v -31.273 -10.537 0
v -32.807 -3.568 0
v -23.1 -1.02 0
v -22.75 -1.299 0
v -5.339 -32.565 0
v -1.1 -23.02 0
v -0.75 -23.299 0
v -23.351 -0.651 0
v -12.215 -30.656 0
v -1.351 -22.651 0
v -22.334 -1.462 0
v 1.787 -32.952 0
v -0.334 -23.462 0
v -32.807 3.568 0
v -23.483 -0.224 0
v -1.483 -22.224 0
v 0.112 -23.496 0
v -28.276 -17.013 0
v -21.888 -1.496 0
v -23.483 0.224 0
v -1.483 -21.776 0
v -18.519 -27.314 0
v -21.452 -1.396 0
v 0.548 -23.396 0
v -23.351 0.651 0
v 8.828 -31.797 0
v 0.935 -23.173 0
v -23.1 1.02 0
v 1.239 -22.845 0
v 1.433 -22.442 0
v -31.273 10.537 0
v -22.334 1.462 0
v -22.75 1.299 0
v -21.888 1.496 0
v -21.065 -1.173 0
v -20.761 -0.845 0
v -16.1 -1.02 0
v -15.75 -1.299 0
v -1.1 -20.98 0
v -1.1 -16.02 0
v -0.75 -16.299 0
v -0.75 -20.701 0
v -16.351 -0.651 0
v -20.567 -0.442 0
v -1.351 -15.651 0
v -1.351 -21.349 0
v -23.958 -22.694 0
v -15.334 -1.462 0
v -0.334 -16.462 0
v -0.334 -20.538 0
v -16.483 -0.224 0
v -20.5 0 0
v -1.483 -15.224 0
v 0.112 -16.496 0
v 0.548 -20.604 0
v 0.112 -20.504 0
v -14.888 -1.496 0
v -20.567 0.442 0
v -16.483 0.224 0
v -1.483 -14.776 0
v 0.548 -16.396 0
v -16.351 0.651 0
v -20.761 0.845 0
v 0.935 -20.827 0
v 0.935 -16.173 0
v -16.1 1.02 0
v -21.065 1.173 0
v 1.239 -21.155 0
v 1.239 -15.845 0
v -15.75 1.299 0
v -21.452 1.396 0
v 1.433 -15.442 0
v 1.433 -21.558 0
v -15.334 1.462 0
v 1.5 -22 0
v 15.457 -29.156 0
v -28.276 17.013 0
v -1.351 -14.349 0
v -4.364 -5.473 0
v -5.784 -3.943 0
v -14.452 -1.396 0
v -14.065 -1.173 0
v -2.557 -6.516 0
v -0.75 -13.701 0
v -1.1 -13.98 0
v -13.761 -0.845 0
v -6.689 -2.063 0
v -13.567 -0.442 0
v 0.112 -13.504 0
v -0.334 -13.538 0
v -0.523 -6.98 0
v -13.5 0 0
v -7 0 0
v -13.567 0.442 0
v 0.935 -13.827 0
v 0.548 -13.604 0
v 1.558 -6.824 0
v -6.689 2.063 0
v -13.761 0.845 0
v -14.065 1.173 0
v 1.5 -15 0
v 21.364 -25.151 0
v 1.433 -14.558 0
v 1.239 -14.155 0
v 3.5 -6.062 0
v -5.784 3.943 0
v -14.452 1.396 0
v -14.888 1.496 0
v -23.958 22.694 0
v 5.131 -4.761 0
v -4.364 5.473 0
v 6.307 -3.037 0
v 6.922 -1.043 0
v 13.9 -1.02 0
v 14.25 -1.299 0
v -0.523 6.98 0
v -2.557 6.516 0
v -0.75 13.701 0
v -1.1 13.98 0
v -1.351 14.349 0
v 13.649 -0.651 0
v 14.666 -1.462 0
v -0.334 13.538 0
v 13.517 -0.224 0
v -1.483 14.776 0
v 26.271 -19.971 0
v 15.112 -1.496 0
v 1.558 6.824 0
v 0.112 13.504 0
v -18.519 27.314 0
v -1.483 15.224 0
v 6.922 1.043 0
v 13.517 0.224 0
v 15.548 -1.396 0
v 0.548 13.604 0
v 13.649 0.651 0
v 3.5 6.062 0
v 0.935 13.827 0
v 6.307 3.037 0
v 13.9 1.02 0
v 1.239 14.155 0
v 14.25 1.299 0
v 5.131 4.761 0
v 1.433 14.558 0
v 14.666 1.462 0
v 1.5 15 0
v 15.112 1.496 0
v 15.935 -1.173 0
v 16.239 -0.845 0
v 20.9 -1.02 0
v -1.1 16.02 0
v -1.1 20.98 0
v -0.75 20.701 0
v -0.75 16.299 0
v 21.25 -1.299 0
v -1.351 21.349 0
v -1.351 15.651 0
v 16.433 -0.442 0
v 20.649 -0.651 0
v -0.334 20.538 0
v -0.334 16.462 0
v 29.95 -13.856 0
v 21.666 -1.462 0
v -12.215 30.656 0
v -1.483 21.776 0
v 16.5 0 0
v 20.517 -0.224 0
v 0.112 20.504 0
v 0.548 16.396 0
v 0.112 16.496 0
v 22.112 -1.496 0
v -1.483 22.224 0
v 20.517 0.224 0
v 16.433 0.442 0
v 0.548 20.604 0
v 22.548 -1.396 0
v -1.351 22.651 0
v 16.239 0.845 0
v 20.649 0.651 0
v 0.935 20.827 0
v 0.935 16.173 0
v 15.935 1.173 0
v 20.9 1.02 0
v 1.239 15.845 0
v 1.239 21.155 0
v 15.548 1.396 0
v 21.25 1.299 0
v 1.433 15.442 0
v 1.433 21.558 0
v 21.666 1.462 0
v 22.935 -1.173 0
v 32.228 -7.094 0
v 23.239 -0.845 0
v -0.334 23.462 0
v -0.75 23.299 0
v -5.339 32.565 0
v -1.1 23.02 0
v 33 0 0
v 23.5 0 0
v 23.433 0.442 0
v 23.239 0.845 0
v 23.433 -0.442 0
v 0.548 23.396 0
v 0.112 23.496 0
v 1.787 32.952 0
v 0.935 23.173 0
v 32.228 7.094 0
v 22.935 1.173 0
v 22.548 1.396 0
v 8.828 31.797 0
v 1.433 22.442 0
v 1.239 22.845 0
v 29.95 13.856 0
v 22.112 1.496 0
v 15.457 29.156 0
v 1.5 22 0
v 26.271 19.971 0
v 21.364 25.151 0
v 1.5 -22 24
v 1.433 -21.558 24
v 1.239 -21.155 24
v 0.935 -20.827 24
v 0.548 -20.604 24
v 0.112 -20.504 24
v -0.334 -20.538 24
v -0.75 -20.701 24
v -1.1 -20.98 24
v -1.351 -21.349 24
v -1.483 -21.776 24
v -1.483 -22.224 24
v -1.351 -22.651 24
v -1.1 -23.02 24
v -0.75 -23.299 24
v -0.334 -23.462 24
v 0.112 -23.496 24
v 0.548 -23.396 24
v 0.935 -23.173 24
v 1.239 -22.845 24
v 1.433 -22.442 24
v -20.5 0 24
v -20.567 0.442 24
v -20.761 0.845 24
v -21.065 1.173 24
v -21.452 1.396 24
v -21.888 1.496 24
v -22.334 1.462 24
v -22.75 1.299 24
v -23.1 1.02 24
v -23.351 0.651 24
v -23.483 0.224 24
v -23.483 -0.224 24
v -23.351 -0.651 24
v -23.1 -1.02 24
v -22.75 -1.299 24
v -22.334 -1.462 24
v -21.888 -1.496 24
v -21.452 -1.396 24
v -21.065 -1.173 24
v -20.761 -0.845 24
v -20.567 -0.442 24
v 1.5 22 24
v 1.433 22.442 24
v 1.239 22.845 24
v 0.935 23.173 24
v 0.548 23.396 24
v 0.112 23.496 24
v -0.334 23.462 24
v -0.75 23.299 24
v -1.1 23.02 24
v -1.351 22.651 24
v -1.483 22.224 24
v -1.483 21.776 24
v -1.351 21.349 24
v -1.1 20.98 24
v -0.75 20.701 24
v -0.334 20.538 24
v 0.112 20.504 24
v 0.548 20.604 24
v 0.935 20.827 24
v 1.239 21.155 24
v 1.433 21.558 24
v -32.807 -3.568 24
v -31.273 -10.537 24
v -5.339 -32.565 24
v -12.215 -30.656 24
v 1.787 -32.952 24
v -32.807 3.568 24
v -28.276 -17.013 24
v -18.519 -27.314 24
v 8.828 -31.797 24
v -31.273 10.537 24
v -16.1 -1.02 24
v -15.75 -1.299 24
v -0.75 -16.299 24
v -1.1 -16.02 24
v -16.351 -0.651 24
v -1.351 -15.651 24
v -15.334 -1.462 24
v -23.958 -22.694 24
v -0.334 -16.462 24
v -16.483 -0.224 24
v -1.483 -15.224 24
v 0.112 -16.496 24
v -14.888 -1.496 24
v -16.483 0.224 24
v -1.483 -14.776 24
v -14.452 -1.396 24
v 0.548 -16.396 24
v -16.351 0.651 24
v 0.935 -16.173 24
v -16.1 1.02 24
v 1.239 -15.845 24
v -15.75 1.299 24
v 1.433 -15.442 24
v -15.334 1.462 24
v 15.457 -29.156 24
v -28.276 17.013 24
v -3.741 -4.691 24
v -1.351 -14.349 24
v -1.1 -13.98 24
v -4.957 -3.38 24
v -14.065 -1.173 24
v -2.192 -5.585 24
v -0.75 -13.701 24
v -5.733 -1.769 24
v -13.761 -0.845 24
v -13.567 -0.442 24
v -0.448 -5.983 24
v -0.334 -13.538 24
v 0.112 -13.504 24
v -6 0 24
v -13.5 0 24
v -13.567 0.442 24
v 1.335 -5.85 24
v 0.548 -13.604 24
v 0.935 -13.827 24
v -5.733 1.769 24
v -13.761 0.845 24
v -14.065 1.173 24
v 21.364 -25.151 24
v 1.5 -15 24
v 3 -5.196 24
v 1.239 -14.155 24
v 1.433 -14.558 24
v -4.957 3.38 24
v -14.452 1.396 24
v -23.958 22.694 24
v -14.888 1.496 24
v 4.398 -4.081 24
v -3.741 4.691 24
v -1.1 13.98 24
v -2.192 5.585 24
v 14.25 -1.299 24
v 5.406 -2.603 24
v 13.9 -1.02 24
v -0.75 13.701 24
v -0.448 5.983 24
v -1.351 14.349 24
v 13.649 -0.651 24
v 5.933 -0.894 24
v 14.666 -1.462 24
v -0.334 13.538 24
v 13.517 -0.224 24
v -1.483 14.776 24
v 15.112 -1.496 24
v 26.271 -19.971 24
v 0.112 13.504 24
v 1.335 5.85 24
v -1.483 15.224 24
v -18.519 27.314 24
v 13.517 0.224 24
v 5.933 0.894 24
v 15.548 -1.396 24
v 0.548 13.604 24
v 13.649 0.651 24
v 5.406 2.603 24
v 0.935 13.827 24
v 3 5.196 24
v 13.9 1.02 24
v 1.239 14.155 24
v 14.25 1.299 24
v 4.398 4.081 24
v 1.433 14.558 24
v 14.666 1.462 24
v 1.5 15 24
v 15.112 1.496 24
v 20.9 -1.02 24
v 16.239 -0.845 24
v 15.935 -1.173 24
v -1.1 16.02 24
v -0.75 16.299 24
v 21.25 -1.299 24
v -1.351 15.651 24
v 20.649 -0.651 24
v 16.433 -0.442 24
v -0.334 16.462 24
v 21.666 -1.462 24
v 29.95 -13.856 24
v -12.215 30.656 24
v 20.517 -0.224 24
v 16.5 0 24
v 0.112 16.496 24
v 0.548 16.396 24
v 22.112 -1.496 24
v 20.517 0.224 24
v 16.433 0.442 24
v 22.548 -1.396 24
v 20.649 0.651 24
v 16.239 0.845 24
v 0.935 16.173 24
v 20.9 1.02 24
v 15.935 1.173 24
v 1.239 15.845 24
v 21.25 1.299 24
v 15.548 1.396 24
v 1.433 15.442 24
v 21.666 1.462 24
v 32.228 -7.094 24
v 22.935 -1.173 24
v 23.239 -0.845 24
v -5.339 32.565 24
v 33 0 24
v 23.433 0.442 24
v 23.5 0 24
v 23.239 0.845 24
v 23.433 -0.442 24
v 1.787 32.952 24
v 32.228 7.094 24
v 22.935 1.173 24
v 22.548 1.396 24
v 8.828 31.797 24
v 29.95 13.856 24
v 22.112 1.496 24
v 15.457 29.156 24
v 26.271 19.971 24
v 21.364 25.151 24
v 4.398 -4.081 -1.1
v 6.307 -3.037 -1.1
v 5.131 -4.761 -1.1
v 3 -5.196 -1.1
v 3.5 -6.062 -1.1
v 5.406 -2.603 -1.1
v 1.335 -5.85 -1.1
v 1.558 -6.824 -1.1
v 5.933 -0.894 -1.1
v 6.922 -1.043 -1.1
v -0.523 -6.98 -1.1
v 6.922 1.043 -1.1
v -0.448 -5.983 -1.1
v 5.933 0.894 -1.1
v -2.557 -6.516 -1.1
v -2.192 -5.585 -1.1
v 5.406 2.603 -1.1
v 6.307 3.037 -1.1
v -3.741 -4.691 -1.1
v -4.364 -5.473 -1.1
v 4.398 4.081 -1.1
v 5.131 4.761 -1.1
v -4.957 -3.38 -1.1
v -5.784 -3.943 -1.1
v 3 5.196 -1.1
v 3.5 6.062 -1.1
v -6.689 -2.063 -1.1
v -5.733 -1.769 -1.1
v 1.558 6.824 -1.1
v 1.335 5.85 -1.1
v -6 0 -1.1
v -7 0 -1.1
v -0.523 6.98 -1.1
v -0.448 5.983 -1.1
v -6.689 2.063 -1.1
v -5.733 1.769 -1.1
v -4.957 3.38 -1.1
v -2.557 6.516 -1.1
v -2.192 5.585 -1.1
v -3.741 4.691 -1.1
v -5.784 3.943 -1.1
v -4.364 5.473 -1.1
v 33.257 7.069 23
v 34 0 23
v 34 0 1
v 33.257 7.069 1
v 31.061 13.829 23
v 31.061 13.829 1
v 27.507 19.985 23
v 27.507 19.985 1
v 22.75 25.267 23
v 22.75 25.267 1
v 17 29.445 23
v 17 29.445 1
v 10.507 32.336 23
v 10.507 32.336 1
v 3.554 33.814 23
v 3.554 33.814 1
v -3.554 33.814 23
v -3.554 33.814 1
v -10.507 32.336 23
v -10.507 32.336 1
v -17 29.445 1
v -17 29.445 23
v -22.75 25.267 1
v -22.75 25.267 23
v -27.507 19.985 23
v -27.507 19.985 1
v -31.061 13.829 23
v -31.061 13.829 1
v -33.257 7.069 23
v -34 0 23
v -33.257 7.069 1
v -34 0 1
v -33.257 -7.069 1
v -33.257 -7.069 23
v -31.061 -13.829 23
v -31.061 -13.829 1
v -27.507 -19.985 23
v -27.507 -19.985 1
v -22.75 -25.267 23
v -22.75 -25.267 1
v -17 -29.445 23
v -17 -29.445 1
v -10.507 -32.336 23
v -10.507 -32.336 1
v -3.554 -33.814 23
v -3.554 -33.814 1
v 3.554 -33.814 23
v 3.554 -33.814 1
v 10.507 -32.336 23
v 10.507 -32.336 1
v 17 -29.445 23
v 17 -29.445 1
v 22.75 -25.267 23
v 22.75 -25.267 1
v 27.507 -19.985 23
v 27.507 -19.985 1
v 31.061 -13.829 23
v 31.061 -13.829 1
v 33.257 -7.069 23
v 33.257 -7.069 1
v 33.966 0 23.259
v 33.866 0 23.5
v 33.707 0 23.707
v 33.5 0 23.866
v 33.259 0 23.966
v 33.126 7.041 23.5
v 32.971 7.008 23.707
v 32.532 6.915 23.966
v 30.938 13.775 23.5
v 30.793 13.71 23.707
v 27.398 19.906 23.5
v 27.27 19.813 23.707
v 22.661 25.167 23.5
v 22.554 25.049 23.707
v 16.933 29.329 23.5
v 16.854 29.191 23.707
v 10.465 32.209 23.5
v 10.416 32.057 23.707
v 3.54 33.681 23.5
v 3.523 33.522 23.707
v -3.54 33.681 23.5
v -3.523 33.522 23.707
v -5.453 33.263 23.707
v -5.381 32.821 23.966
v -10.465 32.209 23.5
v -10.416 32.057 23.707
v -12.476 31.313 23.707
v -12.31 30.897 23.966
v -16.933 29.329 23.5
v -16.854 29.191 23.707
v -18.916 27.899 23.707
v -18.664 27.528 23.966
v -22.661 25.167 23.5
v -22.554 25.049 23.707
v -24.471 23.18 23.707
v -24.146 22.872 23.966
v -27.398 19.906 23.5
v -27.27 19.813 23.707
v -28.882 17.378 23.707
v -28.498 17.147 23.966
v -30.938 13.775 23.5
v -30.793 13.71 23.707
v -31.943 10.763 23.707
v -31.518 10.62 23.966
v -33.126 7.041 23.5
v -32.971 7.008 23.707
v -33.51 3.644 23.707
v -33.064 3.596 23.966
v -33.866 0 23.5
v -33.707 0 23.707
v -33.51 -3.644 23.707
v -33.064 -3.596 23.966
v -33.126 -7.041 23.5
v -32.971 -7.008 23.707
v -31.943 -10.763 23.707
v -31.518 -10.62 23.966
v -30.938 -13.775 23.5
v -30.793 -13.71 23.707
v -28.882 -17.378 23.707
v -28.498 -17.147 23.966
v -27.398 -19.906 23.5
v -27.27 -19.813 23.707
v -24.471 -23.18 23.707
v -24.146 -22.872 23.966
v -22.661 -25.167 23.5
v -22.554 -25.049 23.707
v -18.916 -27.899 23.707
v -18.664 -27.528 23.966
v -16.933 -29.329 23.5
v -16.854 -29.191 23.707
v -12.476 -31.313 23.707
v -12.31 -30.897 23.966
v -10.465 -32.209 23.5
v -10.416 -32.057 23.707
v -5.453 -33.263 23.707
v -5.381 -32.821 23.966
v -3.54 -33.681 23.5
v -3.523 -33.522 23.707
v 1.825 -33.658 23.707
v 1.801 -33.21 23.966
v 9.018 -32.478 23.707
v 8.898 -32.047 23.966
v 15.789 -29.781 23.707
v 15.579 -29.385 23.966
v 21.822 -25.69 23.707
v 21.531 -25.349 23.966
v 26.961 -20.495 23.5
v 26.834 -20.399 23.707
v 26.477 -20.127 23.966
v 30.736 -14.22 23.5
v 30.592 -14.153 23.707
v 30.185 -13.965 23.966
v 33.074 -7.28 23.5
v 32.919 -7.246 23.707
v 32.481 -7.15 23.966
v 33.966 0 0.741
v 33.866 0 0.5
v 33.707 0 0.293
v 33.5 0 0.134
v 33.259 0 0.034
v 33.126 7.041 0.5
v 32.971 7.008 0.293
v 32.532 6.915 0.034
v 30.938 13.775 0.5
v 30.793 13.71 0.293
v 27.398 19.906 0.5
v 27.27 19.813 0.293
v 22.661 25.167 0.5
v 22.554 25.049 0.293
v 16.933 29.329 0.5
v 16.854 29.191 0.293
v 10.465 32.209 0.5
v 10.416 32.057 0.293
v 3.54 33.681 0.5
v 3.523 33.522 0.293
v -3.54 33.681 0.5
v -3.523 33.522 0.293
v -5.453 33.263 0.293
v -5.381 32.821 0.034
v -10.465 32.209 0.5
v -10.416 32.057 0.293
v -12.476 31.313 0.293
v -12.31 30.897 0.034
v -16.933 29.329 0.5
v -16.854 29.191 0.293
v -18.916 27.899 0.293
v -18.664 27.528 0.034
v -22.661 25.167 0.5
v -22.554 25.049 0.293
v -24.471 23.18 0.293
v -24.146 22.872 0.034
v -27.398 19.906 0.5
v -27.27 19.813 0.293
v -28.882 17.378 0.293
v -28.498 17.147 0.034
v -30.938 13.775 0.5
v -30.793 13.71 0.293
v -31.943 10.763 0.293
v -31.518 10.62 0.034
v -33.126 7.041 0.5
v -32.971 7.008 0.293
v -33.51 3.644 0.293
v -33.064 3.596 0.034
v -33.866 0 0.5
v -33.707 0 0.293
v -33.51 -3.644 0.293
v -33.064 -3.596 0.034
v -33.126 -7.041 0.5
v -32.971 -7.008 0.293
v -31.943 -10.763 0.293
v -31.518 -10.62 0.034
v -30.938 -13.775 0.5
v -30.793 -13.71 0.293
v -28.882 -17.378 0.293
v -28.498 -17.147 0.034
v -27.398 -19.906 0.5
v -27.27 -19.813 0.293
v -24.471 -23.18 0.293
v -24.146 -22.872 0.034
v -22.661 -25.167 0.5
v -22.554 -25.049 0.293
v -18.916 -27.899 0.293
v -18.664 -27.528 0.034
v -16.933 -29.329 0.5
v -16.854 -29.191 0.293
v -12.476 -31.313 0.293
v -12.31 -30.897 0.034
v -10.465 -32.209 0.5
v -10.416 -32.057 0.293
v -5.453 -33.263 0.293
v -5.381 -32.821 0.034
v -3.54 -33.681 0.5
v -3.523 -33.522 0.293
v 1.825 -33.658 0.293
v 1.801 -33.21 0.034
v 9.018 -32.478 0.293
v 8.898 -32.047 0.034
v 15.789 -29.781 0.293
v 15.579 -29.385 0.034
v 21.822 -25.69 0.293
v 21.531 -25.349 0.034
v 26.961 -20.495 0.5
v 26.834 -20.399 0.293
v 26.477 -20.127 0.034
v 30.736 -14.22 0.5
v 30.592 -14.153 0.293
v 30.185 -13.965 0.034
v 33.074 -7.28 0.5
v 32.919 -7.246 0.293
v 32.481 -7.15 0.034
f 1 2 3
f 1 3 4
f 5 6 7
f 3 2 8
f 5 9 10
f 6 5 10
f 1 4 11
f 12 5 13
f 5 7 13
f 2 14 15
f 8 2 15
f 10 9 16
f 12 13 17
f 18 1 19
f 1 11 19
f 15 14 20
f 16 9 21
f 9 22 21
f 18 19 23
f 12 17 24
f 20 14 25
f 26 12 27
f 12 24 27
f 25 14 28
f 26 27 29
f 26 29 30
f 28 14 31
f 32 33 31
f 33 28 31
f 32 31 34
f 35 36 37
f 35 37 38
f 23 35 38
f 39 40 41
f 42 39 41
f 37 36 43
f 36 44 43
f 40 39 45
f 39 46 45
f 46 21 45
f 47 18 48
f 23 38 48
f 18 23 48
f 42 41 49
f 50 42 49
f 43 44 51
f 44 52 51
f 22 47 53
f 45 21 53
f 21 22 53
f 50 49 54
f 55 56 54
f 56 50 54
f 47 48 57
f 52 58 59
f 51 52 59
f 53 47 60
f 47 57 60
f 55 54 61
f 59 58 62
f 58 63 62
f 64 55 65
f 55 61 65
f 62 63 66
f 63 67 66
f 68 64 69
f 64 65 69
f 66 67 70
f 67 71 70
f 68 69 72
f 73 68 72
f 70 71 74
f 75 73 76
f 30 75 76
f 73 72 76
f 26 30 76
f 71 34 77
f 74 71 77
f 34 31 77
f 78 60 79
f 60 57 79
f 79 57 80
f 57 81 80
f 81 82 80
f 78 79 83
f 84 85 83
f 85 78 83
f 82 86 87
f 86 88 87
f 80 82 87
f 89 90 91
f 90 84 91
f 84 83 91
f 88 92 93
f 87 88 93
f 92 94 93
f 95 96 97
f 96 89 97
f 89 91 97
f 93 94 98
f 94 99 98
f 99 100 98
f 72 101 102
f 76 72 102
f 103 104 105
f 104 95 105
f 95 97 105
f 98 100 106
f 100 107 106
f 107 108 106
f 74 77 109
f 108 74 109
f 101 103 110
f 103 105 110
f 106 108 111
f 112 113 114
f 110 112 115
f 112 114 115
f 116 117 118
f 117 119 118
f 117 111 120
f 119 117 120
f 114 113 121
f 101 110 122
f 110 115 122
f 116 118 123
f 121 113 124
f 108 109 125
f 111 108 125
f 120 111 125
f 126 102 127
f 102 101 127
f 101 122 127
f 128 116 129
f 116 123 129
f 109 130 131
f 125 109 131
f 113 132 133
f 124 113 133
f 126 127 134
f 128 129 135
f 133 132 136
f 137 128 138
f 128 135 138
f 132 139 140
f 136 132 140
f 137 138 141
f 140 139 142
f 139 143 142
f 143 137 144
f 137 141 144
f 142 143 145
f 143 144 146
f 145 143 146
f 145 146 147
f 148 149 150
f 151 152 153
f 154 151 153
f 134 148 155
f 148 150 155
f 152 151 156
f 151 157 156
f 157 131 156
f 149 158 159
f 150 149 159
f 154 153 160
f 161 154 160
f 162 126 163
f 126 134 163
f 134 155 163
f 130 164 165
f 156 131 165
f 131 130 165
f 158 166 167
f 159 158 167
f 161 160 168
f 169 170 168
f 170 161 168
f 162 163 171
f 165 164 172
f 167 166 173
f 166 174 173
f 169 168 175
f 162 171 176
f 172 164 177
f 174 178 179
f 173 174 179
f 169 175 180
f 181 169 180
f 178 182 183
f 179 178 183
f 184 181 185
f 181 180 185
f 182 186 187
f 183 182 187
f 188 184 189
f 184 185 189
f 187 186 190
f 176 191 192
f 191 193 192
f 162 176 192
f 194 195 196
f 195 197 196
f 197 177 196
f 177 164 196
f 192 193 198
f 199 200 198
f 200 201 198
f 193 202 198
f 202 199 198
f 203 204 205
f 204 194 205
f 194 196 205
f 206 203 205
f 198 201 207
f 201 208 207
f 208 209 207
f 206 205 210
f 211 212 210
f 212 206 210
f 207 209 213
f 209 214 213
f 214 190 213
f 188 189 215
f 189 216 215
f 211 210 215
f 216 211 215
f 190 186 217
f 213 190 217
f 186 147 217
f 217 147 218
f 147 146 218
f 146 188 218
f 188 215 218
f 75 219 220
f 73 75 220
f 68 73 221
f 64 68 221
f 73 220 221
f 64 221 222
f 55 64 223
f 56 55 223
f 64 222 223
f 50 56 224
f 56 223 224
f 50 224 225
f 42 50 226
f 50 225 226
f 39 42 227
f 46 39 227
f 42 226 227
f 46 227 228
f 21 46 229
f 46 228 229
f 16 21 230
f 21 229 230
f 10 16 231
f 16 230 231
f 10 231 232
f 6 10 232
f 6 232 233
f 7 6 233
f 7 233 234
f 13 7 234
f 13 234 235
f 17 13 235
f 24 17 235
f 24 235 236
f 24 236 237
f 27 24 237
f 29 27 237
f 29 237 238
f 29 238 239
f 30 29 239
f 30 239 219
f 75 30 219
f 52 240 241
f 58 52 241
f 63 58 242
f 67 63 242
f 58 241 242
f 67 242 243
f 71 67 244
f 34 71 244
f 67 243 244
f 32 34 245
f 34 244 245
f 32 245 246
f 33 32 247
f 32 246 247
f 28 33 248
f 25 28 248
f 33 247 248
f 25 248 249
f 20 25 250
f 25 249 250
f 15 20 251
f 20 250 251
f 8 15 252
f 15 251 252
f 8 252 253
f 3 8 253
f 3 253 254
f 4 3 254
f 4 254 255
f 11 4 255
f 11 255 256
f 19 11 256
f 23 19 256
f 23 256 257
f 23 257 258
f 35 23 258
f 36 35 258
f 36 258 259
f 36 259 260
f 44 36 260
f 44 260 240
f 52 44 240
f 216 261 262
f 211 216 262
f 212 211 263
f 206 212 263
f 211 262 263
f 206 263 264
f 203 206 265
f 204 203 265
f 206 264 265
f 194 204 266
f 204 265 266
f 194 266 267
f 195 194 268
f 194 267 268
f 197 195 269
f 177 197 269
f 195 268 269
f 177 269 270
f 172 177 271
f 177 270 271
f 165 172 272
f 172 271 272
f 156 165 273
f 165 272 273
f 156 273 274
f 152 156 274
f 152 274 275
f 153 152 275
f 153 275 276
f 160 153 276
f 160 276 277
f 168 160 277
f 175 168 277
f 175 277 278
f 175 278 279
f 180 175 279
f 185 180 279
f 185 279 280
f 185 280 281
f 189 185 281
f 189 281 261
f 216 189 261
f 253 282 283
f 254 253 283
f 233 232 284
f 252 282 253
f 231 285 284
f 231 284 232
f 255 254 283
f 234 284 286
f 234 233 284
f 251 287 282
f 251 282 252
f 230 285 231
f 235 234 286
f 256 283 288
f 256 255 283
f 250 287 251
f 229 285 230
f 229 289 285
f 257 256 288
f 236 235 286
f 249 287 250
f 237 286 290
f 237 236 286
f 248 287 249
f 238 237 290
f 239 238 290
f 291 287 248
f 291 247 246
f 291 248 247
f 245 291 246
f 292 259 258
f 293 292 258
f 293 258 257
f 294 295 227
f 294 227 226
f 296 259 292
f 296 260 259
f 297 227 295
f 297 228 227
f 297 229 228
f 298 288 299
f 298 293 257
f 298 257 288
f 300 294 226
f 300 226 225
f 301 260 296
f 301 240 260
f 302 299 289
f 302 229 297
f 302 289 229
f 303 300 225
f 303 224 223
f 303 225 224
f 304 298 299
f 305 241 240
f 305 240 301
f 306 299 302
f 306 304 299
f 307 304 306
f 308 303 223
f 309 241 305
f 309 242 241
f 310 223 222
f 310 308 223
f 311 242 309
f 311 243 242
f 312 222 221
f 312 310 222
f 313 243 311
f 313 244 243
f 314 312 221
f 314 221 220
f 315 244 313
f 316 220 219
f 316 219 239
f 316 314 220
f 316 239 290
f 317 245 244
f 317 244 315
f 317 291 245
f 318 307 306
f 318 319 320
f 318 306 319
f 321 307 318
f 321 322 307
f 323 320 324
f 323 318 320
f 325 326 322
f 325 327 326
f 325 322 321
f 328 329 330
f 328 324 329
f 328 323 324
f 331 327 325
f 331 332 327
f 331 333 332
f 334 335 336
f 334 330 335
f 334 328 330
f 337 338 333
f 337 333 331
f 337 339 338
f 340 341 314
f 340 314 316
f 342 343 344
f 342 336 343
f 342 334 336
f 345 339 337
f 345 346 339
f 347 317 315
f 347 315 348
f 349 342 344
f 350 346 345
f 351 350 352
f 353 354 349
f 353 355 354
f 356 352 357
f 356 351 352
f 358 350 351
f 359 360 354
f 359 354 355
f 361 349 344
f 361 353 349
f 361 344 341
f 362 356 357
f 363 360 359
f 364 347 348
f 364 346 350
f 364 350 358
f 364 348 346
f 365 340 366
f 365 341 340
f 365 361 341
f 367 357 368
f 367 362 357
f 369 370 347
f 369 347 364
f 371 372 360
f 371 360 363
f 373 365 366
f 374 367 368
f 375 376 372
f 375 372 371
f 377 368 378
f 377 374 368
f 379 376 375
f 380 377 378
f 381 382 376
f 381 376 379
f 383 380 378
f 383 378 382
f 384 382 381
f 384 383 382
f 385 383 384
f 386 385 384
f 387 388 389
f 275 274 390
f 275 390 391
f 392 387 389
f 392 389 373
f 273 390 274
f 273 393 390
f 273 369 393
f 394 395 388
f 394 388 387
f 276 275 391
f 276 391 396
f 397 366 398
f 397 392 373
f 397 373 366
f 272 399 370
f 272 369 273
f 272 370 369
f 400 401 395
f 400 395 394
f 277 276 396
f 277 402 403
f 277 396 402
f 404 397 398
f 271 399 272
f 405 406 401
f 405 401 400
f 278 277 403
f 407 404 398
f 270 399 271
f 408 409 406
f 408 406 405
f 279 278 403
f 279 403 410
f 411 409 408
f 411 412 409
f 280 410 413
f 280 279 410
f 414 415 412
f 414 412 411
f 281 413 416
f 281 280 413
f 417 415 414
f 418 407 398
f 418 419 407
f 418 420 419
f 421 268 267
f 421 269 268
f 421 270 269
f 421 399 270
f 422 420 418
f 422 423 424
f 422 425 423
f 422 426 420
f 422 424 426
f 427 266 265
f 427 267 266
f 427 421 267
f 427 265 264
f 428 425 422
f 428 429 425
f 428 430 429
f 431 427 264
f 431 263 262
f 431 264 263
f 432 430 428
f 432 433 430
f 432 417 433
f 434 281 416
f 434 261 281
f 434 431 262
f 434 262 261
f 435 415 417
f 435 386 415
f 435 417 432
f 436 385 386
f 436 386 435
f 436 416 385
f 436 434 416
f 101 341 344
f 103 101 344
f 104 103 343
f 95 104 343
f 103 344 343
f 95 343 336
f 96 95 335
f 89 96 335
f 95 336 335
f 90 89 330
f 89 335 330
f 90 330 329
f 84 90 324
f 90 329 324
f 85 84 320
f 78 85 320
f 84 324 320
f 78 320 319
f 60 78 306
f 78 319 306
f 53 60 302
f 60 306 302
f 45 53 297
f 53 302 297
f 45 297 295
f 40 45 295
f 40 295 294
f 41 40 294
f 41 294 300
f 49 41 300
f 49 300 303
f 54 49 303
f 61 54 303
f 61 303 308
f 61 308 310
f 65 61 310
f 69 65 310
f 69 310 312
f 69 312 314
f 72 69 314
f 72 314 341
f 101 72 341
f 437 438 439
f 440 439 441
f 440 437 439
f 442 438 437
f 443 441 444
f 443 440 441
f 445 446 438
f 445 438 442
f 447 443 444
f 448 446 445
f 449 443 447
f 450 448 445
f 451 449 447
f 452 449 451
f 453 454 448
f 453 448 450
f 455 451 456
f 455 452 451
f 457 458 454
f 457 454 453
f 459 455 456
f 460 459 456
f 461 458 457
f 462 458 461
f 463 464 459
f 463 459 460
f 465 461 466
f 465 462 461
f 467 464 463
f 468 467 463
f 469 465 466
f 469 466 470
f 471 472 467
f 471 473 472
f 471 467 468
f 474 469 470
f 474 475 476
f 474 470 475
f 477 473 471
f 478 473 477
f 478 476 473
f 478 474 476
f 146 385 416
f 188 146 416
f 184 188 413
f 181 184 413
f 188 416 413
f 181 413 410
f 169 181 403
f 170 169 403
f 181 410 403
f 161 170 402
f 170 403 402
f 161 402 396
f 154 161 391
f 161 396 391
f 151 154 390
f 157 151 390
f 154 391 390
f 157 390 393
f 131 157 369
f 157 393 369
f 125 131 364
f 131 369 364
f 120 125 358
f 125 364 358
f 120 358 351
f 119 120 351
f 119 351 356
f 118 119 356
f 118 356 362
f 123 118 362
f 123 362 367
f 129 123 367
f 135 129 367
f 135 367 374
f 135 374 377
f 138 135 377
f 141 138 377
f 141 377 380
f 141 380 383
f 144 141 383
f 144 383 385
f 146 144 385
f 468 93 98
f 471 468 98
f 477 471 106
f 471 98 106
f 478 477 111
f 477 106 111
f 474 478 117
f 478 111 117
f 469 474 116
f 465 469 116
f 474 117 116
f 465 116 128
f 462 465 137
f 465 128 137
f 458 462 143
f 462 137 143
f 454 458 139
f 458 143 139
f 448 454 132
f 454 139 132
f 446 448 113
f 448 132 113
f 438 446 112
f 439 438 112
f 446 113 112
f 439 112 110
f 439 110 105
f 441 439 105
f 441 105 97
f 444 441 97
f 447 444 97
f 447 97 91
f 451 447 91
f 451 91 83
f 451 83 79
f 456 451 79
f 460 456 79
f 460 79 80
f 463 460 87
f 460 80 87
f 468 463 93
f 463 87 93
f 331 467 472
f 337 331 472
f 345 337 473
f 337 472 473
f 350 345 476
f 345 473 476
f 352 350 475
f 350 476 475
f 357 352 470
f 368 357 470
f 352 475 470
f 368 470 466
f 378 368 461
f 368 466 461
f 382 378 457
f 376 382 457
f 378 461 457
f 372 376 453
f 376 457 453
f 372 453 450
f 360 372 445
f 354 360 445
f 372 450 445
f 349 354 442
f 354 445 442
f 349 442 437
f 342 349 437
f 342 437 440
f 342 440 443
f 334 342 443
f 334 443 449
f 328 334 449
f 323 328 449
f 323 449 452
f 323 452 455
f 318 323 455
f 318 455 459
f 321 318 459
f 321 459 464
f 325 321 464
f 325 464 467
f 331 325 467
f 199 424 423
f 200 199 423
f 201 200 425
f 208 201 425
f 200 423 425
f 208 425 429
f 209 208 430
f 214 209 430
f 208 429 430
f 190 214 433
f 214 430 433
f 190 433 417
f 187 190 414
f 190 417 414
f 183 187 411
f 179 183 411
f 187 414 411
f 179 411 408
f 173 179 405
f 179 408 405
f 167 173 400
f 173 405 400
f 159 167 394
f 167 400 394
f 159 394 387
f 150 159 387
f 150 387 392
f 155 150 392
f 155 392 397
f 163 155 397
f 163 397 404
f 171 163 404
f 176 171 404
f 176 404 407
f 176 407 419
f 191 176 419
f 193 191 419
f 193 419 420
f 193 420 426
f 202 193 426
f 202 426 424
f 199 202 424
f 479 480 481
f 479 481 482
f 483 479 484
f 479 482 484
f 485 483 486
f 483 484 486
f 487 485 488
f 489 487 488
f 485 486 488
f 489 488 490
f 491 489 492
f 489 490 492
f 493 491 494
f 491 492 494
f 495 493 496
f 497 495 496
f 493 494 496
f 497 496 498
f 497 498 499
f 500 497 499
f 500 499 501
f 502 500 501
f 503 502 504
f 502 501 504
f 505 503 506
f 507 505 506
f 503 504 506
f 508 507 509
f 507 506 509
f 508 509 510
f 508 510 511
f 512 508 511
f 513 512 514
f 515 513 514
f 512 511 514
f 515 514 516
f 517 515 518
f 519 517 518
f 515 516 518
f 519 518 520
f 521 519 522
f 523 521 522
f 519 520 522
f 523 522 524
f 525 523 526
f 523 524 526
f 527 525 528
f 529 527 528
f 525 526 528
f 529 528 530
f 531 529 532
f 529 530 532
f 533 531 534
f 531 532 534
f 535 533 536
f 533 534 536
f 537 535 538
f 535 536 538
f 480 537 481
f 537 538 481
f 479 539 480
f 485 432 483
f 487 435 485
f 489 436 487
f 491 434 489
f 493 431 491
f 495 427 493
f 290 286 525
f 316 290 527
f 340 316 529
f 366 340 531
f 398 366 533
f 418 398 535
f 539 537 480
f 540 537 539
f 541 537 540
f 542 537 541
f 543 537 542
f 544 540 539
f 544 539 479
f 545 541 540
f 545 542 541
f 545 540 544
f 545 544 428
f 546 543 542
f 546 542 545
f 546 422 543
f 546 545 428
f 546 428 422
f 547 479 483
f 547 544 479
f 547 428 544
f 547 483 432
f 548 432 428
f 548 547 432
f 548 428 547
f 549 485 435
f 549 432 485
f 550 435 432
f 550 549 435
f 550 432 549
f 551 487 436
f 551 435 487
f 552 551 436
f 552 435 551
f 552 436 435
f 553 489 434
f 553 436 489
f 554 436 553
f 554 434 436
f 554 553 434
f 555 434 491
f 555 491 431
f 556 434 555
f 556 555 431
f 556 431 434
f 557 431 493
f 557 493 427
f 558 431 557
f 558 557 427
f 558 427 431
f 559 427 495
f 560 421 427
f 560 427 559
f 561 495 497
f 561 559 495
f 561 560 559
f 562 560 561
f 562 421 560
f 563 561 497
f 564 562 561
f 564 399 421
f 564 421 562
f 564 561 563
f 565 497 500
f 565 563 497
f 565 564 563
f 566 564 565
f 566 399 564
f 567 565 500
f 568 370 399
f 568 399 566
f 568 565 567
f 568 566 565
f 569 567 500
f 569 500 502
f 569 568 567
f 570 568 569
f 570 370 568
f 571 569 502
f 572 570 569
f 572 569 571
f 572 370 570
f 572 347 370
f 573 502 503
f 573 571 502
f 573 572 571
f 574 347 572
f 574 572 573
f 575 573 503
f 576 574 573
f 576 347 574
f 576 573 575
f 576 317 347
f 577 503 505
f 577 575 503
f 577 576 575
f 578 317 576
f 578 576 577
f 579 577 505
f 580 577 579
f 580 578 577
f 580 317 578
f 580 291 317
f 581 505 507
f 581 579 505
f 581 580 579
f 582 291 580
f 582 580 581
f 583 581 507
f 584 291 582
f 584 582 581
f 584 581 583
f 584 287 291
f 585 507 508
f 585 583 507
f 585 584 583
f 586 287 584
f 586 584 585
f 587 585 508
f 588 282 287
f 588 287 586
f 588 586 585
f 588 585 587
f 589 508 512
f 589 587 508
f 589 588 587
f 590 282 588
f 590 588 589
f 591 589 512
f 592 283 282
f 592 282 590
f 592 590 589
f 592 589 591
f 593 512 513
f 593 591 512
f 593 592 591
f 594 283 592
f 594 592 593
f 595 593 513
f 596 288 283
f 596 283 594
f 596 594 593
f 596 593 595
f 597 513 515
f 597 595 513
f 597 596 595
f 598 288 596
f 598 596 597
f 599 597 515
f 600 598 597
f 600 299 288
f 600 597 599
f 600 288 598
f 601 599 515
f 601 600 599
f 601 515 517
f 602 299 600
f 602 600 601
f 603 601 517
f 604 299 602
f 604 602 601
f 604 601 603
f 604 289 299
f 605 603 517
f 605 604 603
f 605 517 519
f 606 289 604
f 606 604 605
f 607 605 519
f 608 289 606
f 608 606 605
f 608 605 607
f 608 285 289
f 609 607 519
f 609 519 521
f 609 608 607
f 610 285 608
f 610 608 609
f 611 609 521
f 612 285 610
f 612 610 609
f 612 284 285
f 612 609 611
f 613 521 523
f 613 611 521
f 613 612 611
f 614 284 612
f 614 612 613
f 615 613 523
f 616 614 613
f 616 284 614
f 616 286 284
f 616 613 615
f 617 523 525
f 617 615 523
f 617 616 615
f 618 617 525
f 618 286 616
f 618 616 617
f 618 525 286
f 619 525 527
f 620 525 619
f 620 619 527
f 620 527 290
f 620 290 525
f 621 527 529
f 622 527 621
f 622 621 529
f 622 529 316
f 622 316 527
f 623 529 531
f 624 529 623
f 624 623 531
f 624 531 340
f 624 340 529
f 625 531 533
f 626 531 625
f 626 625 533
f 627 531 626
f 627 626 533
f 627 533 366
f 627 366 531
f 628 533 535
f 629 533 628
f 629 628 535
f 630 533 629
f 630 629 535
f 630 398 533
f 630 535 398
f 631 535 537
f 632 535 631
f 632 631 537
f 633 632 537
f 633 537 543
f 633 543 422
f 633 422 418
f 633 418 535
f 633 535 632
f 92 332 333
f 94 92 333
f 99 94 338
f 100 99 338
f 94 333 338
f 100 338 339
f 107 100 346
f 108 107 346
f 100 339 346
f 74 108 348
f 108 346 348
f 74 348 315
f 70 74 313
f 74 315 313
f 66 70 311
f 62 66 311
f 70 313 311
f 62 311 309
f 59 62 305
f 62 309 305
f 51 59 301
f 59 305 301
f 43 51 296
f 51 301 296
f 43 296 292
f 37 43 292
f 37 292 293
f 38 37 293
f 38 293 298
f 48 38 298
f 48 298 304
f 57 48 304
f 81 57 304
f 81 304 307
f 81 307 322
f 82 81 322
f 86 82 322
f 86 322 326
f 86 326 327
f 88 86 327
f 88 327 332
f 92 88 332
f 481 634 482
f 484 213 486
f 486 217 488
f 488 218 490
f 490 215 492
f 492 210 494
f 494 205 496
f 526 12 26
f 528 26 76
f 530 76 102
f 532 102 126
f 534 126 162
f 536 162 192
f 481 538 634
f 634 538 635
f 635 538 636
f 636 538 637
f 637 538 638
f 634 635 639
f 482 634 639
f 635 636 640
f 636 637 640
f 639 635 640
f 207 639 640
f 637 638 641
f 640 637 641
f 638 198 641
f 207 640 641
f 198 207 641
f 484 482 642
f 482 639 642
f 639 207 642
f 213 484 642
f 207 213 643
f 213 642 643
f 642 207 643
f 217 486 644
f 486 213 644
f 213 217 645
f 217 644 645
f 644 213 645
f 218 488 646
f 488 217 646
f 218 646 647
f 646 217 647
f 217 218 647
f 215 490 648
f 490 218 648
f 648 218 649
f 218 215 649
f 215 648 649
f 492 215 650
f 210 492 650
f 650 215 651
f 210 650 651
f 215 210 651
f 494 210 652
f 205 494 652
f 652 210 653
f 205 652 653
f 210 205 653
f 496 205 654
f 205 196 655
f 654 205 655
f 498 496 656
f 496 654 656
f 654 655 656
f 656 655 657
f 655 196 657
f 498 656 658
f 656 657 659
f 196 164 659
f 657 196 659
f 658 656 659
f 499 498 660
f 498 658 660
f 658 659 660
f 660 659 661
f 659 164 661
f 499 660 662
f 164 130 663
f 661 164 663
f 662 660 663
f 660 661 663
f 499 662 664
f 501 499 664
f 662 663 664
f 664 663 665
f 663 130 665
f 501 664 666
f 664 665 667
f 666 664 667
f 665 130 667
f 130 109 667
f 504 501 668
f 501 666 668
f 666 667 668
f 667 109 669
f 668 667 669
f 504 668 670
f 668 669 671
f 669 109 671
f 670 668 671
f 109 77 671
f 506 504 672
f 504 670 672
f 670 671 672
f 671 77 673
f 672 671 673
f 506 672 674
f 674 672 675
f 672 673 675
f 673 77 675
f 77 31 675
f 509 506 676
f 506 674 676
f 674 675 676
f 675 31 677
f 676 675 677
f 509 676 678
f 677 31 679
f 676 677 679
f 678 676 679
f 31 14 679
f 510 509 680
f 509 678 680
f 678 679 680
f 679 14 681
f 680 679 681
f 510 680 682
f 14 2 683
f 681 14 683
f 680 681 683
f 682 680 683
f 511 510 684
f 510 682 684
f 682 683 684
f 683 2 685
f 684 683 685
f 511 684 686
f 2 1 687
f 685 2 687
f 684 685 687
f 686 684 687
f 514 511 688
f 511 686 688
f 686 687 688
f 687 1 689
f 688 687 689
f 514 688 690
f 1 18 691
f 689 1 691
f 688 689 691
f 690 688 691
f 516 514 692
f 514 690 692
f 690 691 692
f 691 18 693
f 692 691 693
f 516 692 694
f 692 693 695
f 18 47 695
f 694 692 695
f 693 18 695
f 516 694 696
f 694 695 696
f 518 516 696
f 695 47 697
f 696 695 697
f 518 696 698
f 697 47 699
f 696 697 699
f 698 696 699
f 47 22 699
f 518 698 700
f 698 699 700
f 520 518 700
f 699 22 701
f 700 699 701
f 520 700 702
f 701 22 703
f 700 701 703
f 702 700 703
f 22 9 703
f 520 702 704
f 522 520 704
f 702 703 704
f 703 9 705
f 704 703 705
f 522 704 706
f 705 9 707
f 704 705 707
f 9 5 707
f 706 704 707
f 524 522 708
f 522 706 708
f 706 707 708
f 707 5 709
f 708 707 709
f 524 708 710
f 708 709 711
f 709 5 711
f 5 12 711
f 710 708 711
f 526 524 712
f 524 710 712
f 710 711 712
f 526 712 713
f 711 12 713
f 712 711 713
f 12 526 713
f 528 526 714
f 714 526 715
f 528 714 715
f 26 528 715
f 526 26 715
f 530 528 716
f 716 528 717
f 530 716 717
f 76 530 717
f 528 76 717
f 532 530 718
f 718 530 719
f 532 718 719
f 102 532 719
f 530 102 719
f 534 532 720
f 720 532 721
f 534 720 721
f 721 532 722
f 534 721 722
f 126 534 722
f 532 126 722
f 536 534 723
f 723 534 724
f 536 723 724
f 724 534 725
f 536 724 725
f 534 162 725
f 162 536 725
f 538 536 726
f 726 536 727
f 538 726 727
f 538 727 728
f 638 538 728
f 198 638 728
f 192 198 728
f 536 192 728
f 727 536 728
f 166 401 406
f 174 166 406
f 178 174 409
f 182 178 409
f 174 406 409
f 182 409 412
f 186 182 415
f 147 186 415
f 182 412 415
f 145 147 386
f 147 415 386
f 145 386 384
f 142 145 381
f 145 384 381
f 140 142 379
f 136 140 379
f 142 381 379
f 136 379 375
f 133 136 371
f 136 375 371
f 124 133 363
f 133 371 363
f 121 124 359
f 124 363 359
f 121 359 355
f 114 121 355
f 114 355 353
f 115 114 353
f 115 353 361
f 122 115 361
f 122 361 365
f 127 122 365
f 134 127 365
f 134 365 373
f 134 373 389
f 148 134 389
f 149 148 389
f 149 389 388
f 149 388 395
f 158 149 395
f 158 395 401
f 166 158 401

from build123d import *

# Parameters (mm, degrees)
SKETCH_1_R          = 34
EXTRUDE_1_DEPTH     = 24
SKETCH_2_R          = 7
EXTRUDE_2_DEPTH     = 1.1
SKETCH_3_R          = 6
CUT_EXTRUDE_1_DEPTH = 28.1
SKETCH_4_R          = 1.5
CUT_EXTRUDE_2_DEPTH = 28.1
FILLET_2_R          = 1
FILLET_3_R          = 1


with BuildPart() as part:
    # 草图1 → 凸台-拉伸1 (new body)
    with BuildSketch(Plane.XY):
        Circle(SKETCH_1_R)
    extrude(amount=EXTRUDE_1_DEPTH)

    # 草图2 → 凸台-拉伸2 (add)
    with BuildSketch(Plane(origin=(0, 0, 0), x_dir=(-1, 0, 0), z_dir=(0, 0, -1))):
        Circle(SKETCH_2_R)
    extrude(amount=EXTRUDE_2_DEPTH)

    # 草图3 → 切除-拉伸1 (cut)
    with BuildSketch(Plane(origin=(0, 0, -1.1), x_dir=(-1, 0, 0), z_dir=(0, 0, -1))):
        Circle(SKETCH_3_R)
    extrude(amount=-CUT_EXTRUDE_1_DEPTH, mode=Mode.SUBTRACT)

    # 草图4 → 切除-拉伸2 (cut)
    with BuildSketch(Plane.XY.offset(24)):
        with Locations((0, 22)):
            Circle(SKETCH_4_R)
        with Locations((0, -22)):
            Circle(SKETCH_4_R)
        with Locations((-22, 0)):
            Circle(SKETCH_4_R)
        with Locations((22, 0)):
            Circle(SKETCH_4_R)
        with Locations((0, 15)):
            Circle(SKETCH_4_R)
        with Locations((-15, 0)):
            Circle(SKETCH_4_R)
        with Locations((15, 0)):
            Circle(SKETCH_4_R)
        with Locations((0, -15)):
            Circle(SKETCH_4_R)
    extrude(amount=-CUT_EXTRUDE_2_DEPTH, mode=Mode.SUBTRACT)

    # 圆角2
    fillet_2_edges = [part.edges().sort_by_distance(p)[0] for p in [
        (-34, 0, 0),
    ]]
    fillet(fillet_2_edges, radius=FILLET_2_R)

    # 圆角3
    fillet_3_edges = [part.edges().sort_by_distance(p)[0] for p in [
        (-34, 0, 24),
    ]]
    fillet(fillet_3_edges, radius=FILLET_3_R)


solid = part.part
